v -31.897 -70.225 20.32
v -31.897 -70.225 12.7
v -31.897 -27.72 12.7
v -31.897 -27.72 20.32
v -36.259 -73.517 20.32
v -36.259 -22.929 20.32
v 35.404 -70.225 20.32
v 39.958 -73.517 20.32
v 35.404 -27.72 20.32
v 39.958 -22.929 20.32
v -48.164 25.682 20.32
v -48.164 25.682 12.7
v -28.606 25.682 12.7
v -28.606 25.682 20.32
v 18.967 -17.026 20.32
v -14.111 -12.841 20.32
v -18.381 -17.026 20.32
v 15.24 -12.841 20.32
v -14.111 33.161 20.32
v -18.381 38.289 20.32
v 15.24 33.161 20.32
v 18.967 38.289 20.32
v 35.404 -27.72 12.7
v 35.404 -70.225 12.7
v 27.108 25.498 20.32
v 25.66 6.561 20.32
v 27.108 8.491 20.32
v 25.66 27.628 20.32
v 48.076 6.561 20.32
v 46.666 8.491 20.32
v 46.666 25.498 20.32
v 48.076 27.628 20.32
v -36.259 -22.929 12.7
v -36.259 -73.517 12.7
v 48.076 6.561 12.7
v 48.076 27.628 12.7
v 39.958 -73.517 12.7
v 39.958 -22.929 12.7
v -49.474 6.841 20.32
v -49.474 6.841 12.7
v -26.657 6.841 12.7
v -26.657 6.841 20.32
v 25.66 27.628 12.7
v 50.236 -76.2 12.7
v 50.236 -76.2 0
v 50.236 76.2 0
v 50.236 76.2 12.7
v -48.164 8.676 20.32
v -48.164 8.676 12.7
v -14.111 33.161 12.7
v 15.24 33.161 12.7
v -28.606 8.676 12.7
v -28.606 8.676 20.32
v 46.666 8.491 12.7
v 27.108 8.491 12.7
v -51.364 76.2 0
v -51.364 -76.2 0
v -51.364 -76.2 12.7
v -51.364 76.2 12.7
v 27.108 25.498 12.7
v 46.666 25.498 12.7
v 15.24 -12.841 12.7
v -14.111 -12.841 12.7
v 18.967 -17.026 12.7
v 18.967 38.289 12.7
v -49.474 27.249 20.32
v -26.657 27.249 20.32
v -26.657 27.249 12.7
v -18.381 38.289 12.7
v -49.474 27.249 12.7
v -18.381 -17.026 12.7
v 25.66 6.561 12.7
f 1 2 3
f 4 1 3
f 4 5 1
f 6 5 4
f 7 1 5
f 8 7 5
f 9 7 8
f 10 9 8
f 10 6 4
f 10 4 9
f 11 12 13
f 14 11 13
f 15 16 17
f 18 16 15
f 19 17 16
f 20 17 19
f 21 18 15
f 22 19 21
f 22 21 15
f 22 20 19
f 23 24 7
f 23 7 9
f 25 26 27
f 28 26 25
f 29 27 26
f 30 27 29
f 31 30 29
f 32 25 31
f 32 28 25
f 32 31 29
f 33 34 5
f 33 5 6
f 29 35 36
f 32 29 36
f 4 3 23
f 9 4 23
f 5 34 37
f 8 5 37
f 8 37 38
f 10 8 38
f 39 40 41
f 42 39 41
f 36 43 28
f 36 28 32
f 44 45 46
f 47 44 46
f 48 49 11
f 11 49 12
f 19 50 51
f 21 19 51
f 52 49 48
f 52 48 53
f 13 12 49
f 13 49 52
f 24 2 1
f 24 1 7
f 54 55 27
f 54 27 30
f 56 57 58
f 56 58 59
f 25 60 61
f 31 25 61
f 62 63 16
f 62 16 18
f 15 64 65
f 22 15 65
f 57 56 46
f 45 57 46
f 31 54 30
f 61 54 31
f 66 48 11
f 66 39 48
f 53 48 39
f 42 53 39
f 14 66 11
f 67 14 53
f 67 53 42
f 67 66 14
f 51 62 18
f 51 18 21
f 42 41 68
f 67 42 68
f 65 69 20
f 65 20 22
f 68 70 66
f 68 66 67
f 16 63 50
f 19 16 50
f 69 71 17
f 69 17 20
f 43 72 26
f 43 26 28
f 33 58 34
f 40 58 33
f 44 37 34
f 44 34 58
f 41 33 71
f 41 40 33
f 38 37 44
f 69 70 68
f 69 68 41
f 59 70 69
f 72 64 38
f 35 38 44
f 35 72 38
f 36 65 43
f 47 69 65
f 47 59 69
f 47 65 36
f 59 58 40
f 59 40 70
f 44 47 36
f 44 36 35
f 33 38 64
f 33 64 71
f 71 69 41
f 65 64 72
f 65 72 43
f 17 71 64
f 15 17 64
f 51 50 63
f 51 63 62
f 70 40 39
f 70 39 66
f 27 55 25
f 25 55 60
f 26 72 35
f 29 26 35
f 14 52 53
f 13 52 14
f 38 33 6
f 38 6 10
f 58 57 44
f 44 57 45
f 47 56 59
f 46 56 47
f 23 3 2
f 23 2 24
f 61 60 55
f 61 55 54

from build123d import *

# Parameters (mm, degrees)
F0_W     = 101.6
F0_H     = 152.4
F0_W_2   = 25.9637702256
F0_H_2   = 38.2640473545
F1_DEPTH = 12.7
F2_W     = 37.3481158167
F2_H     = 55.3146842867
F2_W_2   = 29.3511133641
F2_H_2   = 46.0022222251
F2_W_3   = 76.2175656855
F2_H_3   = 50.5883861333
F2_W_4   = 67.3006474972
F2_H_4   = 42.5056517124
F2_W_5   = 22.4156714976
F2_H_5   = 21.067361813
F2_W_6   = 19.5578802377
F2_H_6   = 17.0068526641
F2_W_7   = 22.81752415
F2_H_7   = 20.4082219861
F3_DEPTH = 7.62


with BuildPart() as f1:
    # F0 (on Top) → F1 (new body)
    with BuildSketch(Plane.XY):
        with Locations((-0.5644435562, 0)):
            Rectangle(F0_W, F0_H)
        with Locations((0.3079539165, 19.1320236772)):
            Rectangle(F0_W_2, F0_H_2, mode=Mode.SUBTRACT)
        with Locations((0.3079539165, 19.1320236772)):
            Rectangle(F0_W_2, F0_H_2)
    extrude(amount=F1_DEPTH)

    # F2 (on face) → F3 (join)
    with BuildSketch(Plane.XY.offset(12.7)):
        with Locations((0.2927491441, 10.6312921271)):
            Rectangle(F2_W, F2_H)
        with Locations((0.5644438788, 10.1600000635)):
            Rectangle(F2_W_2, F2_H_2, mode=Mode.SUBTRACT)
        with Locations((1.8496308476, -48.2227718458)):
            Rectangle(F2_W_3, F2_H_3)
        with Locations((1.7533935606, -48.9725470543)):
            Rectangle(F2_W_4, F2_H_4, mode=Mode.SUBTRACT)
        with Locations((36.8676688522, 17.0947427396)):
            Rectangle(F2_W_5, F2_H_5)
        with Locations((36.8869742379, 16.9948018156)):
            Rectangle(F2_W_6, F2_H_6, mode=Mode.SUBTRACT)
        with Locations((-38.0652910098, 17.0451246668)):
            Rectangle(F2_W_7, F2_H_7)
        with Locations((-38.3849483915, 17.1790141612)):
            Rectangle(F2_W_6, F2_H_6, mode=Mode.SUBTRACT)
    extrude(amount=F3_DEPTH)


solid = f1.part
